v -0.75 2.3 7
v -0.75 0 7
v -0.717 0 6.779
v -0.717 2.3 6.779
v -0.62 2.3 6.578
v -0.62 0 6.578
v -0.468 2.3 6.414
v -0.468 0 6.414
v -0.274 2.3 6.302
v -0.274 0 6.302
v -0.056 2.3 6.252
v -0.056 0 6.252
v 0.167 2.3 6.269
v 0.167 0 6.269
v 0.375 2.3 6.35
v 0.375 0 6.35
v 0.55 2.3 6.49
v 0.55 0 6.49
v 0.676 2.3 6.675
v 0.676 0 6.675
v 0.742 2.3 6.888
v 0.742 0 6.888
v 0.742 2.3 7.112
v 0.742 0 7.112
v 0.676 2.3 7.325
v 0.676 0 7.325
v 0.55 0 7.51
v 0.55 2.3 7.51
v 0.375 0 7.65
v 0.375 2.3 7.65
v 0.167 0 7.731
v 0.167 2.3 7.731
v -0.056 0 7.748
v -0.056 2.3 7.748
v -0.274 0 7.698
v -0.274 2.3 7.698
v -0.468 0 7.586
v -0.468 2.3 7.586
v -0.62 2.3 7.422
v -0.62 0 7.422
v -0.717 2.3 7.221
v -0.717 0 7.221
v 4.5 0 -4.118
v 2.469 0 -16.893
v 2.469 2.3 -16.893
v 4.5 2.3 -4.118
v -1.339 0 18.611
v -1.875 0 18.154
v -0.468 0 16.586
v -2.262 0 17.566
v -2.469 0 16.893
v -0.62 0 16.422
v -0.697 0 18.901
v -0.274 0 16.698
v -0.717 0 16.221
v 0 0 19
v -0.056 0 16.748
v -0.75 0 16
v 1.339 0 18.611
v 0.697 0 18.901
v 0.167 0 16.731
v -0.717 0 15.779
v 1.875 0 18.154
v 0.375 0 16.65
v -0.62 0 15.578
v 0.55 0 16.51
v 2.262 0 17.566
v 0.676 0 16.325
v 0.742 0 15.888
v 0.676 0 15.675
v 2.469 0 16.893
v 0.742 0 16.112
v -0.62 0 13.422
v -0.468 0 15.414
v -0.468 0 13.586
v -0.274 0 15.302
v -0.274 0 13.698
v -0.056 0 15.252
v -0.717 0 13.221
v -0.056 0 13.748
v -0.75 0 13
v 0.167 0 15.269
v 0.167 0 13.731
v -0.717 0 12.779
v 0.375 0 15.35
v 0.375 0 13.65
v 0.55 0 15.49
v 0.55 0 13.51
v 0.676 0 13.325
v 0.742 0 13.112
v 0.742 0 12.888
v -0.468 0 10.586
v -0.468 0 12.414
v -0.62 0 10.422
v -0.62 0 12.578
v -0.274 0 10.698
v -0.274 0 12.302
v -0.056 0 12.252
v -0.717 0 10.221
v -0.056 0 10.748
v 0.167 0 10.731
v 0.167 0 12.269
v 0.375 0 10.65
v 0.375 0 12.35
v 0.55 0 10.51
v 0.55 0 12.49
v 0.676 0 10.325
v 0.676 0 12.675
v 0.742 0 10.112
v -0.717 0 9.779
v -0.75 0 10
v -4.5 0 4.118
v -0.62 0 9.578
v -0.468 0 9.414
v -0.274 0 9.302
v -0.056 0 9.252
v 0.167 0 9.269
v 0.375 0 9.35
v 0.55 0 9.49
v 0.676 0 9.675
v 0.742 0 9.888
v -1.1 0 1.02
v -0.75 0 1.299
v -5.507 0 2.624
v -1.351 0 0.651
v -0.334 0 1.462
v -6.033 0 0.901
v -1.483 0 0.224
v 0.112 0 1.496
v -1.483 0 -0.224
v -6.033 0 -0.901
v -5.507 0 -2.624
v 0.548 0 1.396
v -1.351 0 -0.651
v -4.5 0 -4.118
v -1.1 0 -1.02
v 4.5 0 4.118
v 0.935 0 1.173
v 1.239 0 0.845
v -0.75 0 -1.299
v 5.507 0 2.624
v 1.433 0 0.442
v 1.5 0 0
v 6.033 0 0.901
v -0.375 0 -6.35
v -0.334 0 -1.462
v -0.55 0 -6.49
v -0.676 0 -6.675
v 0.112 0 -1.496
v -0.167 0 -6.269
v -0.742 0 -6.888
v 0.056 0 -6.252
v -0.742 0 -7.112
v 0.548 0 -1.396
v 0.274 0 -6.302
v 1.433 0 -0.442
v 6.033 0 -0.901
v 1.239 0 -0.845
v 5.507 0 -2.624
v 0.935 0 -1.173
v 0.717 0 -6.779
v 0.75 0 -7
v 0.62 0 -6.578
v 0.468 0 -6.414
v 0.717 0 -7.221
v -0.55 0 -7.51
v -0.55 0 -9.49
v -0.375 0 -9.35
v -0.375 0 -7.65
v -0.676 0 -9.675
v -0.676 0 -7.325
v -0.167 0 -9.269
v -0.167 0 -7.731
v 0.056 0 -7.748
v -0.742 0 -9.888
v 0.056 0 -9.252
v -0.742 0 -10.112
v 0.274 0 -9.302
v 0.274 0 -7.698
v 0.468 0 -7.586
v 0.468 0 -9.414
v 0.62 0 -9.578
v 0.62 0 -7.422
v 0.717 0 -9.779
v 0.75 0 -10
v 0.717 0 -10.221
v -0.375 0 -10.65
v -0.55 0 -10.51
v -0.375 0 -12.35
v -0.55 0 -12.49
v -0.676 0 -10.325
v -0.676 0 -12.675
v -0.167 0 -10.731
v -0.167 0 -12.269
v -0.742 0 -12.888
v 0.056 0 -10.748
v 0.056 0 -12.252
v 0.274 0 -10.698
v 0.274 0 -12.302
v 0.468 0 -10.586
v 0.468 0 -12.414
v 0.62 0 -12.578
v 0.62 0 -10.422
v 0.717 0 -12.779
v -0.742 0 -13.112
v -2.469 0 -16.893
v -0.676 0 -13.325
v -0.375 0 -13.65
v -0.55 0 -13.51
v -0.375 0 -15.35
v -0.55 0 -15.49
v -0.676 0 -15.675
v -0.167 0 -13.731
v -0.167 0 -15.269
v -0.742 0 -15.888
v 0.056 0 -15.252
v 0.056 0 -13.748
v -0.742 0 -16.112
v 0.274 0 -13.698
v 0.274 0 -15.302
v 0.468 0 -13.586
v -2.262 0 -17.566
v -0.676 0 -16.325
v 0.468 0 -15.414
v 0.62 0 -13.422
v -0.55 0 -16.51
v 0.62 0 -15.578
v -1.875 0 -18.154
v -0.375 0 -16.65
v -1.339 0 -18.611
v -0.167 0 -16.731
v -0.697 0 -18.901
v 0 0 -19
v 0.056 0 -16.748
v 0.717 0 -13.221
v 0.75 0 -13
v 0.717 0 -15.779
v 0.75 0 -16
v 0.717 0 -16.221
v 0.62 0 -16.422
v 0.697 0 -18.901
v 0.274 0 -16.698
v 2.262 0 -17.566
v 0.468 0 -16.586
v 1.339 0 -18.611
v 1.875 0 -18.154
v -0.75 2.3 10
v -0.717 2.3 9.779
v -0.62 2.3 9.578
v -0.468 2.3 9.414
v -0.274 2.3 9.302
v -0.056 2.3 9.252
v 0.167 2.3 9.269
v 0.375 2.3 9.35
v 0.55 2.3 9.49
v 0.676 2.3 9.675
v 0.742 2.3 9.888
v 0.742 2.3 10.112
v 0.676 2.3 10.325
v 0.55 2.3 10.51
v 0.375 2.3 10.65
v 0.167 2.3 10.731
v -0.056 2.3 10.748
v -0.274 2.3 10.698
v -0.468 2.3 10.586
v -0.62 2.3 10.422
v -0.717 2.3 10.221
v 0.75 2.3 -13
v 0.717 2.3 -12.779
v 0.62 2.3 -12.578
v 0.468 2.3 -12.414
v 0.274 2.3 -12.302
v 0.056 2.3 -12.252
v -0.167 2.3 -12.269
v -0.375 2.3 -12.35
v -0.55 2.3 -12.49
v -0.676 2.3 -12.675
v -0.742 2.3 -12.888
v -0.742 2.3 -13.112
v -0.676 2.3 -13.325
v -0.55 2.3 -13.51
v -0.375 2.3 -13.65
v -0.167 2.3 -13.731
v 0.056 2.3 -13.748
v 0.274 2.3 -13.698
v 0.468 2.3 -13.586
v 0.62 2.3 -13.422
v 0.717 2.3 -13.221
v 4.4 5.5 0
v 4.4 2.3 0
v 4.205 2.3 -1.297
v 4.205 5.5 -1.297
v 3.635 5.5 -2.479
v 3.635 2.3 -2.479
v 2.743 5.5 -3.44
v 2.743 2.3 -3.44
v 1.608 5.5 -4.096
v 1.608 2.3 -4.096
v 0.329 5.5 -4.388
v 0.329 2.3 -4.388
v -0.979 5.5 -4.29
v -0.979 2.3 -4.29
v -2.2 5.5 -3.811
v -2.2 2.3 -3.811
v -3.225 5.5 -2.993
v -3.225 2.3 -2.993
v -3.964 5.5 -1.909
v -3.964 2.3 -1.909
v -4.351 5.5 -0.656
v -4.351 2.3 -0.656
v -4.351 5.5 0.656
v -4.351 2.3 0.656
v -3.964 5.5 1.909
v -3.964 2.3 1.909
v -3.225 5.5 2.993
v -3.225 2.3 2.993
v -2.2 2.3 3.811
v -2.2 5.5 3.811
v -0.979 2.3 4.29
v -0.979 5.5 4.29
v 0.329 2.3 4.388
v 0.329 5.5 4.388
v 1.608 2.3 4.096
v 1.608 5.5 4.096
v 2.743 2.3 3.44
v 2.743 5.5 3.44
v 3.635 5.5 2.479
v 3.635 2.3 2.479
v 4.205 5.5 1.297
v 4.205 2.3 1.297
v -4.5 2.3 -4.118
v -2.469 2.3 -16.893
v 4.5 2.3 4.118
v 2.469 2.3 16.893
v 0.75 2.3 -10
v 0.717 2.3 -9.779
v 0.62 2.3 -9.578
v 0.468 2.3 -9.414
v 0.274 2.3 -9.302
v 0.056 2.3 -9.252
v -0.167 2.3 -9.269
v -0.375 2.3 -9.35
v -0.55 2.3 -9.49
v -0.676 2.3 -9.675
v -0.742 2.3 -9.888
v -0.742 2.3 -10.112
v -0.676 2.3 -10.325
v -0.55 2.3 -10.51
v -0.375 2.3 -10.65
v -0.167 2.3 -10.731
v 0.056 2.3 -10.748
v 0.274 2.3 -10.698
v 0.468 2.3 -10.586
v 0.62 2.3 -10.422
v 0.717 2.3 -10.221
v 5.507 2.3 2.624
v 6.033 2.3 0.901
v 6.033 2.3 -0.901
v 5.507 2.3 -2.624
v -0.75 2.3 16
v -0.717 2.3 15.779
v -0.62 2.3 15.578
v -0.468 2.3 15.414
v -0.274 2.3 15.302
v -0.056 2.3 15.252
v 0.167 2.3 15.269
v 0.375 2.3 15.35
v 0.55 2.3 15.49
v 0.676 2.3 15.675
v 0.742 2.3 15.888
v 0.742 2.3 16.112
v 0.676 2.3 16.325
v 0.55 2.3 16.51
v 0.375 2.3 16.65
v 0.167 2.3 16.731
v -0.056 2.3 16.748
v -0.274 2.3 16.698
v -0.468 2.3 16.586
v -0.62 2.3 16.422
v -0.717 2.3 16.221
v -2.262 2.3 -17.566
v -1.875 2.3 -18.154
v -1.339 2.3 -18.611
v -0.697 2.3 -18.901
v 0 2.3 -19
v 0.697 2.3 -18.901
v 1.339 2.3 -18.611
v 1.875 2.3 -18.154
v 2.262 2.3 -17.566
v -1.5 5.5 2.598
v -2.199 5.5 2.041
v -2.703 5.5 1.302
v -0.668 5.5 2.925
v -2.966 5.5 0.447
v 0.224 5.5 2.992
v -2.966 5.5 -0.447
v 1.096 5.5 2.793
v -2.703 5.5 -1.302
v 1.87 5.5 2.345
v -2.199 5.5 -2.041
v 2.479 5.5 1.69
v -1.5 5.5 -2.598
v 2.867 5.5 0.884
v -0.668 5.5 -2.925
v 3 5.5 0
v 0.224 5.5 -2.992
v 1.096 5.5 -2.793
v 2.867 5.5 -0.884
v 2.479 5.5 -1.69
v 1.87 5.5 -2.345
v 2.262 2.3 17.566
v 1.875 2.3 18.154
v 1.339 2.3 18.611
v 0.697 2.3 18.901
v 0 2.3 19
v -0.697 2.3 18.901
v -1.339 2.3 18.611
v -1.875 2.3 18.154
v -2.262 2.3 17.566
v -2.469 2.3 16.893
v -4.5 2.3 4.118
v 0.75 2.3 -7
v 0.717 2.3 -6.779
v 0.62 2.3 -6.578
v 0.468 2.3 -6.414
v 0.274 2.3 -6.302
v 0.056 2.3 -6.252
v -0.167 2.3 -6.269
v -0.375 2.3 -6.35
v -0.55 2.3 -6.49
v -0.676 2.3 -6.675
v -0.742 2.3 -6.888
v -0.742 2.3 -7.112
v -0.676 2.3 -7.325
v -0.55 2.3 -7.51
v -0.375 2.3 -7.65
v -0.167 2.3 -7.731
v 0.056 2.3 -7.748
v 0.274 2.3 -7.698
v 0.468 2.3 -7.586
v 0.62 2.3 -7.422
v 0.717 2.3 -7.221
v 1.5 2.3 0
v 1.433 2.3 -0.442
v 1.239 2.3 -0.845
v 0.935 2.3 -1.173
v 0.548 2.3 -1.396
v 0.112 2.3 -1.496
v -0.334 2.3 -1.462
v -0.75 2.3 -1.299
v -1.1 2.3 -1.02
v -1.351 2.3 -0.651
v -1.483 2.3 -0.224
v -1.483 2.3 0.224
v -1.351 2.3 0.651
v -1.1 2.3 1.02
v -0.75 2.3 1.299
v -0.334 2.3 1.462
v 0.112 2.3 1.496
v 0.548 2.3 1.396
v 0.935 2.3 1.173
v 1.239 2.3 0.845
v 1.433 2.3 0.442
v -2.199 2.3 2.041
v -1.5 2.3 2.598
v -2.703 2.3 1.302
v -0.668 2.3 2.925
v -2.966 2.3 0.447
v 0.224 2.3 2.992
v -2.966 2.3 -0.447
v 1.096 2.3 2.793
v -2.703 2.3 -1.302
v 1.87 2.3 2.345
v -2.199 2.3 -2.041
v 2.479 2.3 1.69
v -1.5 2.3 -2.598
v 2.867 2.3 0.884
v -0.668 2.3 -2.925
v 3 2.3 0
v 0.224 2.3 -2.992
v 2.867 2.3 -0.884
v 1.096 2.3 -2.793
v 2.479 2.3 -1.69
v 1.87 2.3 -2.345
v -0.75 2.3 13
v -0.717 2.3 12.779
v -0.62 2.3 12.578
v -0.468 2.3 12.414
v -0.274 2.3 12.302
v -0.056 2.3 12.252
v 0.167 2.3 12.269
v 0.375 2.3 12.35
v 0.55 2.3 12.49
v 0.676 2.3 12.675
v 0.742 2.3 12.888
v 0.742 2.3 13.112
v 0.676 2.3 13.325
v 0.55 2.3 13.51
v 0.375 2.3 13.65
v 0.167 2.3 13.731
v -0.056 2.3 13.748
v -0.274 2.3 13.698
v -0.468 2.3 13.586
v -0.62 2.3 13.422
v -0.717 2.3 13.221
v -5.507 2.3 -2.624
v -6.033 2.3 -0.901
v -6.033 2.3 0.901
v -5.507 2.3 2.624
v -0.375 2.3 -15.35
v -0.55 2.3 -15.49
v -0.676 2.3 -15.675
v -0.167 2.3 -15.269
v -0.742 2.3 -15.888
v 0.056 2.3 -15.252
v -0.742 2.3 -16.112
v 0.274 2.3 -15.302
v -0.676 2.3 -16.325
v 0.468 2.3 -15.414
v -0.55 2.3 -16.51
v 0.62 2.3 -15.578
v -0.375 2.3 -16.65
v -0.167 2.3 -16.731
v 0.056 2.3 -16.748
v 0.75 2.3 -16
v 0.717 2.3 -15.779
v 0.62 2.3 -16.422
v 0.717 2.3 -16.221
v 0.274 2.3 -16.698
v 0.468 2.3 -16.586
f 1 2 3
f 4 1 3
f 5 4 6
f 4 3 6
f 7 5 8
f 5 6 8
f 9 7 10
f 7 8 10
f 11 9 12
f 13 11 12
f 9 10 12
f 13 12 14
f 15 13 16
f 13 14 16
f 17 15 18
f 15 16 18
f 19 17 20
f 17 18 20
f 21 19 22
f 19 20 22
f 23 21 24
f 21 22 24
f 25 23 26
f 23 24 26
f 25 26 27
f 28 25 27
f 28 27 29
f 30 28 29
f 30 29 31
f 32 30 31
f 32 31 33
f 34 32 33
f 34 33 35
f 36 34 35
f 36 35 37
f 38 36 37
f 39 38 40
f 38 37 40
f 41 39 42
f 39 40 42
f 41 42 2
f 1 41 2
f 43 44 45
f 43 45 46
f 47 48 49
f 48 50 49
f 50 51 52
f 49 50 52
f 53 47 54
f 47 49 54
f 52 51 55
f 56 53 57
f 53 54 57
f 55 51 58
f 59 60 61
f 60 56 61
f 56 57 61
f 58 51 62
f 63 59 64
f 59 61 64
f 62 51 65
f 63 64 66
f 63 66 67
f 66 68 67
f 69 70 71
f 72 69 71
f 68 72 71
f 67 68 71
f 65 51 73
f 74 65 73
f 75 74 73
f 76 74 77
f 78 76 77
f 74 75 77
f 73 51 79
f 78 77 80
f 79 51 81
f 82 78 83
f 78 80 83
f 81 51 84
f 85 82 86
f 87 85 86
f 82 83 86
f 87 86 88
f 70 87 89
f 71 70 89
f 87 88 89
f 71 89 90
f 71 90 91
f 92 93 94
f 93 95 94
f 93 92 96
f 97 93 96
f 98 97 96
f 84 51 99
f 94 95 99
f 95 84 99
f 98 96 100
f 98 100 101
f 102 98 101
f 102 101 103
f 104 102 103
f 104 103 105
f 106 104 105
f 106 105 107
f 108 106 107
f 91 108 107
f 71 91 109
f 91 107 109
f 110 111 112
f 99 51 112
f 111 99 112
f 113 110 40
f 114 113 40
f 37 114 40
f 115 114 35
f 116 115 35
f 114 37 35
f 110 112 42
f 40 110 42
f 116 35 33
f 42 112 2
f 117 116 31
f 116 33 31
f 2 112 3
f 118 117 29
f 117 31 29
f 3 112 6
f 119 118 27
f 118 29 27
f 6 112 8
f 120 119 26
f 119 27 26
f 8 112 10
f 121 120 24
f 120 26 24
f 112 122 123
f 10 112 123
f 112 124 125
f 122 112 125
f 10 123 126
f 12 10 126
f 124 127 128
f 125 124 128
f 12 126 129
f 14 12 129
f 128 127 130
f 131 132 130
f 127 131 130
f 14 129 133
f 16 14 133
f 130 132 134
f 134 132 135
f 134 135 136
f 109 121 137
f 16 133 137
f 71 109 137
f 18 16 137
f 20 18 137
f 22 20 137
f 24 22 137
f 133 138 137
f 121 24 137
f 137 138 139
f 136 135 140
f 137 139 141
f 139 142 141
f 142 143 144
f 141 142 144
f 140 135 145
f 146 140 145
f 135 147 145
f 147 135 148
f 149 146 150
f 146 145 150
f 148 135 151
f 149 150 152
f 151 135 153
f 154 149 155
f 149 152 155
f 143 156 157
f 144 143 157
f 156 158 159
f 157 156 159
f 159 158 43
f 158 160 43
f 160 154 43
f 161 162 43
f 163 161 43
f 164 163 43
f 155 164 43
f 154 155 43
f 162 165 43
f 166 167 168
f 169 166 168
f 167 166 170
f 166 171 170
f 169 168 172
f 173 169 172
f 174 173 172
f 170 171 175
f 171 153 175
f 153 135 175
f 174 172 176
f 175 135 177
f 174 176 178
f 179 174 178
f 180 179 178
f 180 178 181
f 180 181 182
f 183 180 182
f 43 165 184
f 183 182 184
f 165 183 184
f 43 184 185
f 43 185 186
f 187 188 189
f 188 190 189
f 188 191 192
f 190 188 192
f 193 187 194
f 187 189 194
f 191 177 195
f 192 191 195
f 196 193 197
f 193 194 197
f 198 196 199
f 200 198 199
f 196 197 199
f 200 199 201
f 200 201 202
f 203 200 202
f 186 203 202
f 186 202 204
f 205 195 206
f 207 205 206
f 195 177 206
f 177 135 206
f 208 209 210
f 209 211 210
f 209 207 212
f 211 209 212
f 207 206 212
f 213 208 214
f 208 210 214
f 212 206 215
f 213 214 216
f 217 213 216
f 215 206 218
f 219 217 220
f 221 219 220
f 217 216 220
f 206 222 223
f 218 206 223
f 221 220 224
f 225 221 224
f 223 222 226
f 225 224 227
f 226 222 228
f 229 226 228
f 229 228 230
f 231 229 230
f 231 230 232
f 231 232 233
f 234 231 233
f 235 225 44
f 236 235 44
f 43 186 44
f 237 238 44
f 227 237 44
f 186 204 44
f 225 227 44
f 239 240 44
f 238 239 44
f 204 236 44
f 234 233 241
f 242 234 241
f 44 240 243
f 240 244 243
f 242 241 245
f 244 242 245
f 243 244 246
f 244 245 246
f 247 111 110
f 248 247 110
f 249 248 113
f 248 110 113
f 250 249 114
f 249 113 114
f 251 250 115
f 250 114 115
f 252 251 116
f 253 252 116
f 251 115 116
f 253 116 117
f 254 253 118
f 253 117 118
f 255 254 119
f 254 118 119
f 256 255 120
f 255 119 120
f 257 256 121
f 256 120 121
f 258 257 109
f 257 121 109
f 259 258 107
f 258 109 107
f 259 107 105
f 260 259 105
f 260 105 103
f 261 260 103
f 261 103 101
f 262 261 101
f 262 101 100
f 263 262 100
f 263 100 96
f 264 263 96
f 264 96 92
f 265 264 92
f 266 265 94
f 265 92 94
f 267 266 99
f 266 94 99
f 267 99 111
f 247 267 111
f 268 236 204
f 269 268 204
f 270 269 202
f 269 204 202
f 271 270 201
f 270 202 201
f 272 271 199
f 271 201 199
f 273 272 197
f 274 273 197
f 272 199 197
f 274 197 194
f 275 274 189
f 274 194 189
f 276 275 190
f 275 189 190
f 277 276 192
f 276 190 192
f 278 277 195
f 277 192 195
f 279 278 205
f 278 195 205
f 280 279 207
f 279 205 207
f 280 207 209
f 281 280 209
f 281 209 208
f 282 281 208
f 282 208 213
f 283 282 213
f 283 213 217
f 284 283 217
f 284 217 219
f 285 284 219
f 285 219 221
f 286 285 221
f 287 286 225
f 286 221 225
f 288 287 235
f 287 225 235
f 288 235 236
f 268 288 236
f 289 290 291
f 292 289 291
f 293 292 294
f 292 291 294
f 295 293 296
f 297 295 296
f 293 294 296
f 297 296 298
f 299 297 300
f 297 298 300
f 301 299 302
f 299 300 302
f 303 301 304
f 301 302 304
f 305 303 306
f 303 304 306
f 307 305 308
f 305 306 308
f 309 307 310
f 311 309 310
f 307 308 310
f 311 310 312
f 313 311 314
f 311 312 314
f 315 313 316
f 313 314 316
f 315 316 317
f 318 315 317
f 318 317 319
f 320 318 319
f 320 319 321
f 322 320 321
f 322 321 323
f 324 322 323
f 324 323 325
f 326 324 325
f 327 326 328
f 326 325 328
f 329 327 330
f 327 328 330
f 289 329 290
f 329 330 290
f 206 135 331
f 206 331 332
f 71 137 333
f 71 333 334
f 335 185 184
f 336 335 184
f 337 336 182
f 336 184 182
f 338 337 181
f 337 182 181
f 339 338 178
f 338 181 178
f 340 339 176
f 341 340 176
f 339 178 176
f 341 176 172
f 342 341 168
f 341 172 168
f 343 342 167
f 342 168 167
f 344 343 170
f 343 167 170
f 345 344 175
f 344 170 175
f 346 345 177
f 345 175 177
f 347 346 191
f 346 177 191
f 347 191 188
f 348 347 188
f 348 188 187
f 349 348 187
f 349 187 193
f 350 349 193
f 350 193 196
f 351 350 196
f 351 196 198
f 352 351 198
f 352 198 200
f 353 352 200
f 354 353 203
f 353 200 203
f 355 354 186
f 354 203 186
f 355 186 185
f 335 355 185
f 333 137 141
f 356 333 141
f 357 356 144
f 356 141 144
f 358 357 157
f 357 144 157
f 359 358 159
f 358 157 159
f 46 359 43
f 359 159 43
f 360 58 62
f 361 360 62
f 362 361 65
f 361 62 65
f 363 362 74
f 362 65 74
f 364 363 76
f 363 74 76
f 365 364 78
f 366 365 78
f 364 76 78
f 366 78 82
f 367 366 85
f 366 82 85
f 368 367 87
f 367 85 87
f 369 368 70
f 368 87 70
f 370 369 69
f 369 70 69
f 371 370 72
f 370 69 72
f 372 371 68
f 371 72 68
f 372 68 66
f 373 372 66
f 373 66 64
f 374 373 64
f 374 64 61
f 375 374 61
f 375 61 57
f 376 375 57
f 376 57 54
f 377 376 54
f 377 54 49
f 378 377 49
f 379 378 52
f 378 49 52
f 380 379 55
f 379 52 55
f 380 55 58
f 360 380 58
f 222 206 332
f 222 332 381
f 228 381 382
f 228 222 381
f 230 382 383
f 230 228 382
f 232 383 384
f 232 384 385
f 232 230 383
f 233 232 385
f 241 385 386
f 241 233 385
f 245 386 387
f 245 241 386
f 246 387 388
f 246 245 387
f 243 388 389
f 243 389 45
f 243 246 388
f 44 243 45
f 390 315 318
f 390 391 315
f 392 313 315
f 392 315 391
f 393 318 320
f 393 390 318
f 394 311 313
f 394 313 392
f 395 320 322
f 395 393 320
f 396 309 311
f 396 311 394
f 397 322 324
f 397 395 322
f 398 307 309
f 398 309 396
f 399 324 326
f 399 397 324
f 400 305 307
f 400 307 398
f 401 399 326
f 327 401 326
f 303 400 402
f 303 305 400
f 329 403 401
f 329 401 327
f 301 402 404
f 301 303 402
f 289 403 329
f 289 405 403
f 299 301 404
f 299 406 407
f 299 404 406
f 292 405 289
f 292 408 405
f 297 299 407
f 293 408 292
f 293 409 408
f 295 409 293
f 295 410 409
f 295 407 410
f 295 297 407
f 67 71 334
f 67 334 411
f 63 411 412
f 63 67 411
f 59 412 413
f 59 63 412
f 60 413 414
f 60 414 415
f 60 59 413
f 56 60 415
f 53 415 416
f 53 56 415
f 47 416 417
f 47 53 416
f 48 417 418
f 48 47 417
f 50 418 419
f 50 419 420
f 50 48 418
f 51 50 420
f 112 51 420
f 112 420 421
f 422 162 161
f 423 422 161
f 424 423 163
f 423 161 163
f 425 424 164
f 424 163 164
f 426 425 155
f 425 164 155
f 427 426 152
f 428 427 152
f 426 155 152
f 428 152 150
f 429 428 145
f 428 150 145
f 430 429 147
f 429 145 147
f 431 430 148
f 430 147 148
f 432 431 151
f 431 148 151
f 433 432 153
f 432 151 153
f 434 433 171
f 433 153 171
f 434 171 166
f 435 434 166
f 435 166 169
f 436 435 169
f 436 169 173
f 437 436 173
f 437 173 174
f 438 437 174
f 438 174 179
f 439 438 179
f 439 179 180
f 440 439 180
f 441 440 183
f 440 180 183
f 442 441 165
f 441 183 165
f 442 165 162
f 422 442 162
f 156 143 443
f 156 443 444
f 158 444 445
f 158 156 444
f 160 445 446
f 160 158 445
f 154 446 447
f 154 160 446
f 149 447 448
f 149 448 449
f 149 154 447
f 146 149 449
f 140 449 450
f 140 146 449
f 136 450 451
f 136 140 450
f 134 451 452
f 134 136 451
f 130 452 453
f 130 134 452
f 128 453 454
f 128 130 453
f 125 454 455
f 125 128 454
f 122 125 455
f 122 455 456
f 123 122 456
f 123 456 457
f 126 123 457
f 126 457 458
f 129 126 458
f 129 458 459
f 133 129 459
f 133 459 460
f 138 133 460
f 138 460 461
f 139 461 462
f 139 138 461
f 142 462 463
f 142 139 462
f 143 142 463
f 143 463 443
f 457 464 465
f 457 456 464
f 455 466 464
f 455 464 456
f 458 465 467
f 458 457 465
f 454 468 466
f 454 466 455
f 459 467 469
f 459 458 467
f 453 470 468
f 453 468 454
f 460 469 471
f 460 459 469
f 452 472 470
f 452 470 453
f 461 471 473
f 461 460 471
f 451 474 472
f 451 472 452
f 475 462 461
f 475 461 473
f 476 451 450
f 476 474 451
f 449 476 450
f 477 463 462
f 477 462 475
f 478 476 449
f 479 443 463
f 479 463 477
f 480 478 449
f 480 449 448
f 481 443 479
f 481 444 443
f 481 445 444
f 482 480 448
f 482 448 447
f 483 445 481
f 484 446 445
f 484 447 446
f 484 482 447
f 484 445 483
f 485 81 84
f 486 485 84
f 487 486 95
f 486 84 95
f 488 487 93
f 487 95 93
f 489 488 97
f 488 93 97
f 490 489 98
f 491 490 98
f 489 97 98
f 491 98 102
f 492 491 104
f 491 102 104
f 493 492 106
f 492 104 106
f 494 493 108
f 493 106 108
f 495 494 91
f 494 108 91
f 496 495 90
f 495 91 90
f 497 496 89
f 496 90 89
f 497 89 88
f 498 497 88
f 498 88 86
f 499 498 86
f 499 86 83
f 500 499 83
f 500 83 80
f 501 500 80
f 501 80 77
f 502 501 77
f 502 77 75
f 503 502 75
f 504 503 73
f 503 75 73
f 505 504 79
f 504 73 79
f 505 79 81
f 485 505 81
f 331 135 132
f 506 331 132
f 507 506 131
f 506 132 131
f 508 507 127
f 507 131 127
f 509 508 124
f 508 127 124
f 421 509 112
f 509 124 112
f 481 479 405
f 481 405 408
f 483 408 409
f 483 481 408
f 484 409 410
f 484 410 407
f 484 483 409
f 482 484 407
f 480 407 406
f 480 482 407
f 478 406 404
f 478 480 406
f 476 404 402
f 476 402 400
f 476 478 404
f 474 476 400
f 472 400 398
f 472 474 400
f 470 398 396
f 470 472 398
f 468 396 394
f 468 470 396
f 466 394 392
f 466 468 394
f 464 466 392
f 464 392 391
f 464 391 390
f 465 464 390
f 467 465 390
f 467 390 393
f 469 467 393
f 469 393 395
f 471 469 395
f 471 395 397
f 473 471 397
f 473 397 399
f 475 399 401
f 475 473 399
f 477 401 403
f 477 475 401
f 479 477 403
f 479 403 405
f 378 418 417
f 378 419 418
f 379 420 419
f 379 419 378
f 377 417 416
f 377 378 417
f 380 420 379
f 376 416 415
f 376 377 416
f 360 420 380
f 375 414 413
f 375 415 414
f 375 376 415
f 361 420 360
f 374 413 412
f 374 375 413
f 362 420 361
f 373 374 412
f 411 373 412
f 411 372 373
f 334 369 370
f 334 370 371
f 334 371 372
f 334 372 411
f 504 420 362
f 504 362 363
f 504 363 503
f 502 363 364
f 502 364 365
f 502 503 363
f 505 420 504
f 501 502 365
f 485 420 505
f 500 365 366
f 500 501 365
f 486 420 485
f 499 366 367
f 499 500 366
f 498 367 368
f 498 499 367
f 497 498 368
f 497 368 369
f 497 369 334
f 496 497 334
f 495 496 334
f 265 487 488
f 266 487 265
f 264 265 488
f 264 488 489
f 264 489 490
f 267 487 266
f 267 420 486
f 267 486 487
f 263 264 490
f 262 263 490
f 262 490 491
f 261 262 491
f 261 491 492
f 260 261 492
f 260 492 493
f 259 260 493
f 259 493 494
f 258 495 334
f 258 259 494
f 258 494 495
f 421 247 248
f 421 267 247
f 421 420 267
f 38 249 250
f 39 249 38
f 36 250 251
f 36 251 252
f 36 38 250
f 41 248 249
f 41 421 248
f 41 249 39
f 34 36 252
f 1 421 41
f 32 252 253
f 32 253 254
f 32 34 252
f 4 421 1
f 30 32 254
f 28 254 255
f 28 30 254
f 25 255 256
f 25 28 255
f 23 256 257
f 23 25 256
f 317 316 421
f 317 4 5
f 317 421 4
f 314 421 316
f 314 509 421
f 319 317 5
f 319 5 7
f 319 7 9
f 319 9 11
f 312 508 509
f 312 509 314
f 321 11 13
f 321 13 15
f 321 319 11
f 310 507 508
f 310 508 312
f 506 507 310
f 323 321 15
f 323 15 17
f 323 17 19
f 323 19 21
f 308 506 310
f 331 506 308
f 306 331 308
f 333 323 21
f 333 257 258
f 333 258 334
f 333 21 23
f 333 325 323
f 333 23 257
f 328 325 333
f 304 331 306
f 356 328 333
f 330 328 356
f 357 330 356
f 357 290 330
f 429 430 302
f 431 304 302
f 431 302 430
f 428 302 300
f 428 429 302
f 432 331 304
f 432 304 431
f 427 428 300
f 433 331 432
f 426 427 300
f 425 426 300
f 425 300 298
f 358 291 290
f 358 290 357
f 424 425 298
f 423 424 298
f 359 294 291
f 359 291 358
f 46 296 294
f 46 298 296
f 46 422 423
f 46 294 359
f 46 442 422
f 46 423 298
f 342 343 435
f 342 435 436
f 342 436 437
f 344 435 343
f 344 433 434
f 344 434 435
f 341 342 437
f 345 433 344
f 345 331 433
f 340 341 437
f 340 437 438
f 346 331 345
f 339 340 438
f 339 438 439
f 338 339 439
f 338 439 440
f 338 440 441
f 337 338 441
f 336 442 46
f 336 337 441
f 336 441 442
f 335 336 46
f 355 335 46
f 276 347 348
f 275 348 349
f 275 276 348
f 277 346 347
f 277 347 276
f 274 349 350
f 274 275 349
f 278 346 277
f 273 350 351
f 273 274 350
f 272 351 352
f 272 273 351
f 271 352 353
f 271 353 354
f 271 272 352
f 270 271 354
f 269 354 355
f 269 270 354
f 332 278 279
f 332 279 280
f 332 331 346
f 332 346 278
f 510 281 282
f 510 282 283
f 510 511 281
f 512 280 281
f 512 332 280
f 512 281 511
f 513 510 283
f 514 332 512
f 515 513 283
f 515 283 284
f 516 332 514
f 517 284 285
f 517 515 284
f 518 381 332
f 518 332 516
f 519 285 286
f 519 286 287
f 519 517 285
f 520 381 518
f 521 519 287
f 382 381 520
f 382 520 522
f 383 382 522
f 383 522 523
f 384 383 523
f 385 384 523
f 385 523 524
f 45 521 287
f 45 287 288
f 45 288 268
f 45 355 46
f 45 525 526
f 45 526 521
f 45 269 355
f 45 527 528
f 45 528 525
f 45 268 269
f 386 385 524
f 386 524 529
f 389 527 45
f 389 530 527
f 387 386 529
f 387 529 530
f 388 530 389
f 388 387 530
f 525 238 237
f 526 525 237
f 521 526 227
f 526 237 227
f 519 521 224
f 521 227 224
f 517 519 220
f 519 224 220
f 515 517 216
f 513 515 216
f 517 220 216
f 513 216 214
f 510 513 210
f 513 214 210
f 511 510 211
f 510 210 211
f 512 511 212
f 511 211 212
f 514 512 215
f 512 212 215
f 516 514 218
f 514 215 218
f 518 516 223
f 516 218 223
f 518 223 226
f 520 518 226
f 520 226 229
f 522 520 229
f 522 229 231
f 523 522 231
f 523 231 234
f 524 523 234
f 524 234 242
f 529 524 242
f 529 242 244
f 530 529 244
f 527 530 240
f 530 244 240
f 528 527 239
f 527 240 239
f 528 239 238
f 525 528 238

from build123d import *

# Parameters (mm, degrees)
SKETCH1_R           = 6.1
SKETCH1_R_2         = 1.5
BOSS_EXTRUDE1_DEPTH = 2.3
SKETCH2_R           = 4.4
SKETCH2_R_2         = 3
BOSS_EXTRUDE2_DEPTH = 3.2
SKETCH3_R           = 0.75
BOSS_EXTRUDE3_DEPTH = 2.3
CIRPATTERN1_COUNT   = 2


with BuildPart() as part:
    # Sketch1 → Boss-Extrude1 (new body)
    with BuildSketch(Plane(origin=(0, 0, 0), x_dir=(1, 0, 0), z_dir=(0, 1, 0))):
        Circle(SKETCH1_R)
        Circle(SKETCH1_R_2, mode=Mode.SUBTRACT)
    extrude(amount=BOSS_EXTRUDE1_DEPTH)

    # Sketch2 → Boss-Extrude2 (add)
    with BuildSketch(Plane(origin=(0, 2.3, 0), x_dir=(1, 0, 0), z_dir=(0, 1, 0))):
        Circle(SKETCH2_R)
        Circle(SKETCH2_R_2, mode=Mode.SUBTRACT)
    extrude(amount=BOSS_EXTRUDE2_DEPTH)

    # Sketch3 → Boss-Extrude3 (add)
    with BuildSketch(Plane.XZ):
        with BuildLine():
            Line((-4.5, -4.118252056), (-2.468988638, -16.892549493))
            ThreePointArc((-2.468988638, -16.892549493), (0, -19), (2.468988638, -16.892549493))
            Line((2.468988638, -16.892549493), (4.5, -4.118252056))
            ThreePointArc((4.5, -4.118252056), (0, -6.1), (-4.5, -4.118252056))
        make_face()
        with Locations((0, -16)):
            Circle(SKETCH3_R, mode=Mode.SUBTRACT)
        with Locations((0, -13)):
            Circle(SKETCH3_R, mode=Mode.SUBTRACT)
        with Locations((0, -10)):
            Circle(SKETCH3_R, mode=Mode.SUBTRACT)
        with Locations((0, -7)):
            Circle(SKETCH3_R, mode=Mode.SUBTRACT)
    boss_extrude3 = extrude(amount=-BOSS_EXTRUDE3_DEPTH)

    # CirPattern1: Boss-Extrude3 ×2 about axis
    cirpattern1_axis = Axis((0, 0, 0), (0, 1, 0))
    for i in range(1, CIRPATTERN1_COUNT):
        add(boss_extrude3.rotate(cirpattern1_axis, i * 360 / CIRPATTERN1_COUNT))


solid = part.part
